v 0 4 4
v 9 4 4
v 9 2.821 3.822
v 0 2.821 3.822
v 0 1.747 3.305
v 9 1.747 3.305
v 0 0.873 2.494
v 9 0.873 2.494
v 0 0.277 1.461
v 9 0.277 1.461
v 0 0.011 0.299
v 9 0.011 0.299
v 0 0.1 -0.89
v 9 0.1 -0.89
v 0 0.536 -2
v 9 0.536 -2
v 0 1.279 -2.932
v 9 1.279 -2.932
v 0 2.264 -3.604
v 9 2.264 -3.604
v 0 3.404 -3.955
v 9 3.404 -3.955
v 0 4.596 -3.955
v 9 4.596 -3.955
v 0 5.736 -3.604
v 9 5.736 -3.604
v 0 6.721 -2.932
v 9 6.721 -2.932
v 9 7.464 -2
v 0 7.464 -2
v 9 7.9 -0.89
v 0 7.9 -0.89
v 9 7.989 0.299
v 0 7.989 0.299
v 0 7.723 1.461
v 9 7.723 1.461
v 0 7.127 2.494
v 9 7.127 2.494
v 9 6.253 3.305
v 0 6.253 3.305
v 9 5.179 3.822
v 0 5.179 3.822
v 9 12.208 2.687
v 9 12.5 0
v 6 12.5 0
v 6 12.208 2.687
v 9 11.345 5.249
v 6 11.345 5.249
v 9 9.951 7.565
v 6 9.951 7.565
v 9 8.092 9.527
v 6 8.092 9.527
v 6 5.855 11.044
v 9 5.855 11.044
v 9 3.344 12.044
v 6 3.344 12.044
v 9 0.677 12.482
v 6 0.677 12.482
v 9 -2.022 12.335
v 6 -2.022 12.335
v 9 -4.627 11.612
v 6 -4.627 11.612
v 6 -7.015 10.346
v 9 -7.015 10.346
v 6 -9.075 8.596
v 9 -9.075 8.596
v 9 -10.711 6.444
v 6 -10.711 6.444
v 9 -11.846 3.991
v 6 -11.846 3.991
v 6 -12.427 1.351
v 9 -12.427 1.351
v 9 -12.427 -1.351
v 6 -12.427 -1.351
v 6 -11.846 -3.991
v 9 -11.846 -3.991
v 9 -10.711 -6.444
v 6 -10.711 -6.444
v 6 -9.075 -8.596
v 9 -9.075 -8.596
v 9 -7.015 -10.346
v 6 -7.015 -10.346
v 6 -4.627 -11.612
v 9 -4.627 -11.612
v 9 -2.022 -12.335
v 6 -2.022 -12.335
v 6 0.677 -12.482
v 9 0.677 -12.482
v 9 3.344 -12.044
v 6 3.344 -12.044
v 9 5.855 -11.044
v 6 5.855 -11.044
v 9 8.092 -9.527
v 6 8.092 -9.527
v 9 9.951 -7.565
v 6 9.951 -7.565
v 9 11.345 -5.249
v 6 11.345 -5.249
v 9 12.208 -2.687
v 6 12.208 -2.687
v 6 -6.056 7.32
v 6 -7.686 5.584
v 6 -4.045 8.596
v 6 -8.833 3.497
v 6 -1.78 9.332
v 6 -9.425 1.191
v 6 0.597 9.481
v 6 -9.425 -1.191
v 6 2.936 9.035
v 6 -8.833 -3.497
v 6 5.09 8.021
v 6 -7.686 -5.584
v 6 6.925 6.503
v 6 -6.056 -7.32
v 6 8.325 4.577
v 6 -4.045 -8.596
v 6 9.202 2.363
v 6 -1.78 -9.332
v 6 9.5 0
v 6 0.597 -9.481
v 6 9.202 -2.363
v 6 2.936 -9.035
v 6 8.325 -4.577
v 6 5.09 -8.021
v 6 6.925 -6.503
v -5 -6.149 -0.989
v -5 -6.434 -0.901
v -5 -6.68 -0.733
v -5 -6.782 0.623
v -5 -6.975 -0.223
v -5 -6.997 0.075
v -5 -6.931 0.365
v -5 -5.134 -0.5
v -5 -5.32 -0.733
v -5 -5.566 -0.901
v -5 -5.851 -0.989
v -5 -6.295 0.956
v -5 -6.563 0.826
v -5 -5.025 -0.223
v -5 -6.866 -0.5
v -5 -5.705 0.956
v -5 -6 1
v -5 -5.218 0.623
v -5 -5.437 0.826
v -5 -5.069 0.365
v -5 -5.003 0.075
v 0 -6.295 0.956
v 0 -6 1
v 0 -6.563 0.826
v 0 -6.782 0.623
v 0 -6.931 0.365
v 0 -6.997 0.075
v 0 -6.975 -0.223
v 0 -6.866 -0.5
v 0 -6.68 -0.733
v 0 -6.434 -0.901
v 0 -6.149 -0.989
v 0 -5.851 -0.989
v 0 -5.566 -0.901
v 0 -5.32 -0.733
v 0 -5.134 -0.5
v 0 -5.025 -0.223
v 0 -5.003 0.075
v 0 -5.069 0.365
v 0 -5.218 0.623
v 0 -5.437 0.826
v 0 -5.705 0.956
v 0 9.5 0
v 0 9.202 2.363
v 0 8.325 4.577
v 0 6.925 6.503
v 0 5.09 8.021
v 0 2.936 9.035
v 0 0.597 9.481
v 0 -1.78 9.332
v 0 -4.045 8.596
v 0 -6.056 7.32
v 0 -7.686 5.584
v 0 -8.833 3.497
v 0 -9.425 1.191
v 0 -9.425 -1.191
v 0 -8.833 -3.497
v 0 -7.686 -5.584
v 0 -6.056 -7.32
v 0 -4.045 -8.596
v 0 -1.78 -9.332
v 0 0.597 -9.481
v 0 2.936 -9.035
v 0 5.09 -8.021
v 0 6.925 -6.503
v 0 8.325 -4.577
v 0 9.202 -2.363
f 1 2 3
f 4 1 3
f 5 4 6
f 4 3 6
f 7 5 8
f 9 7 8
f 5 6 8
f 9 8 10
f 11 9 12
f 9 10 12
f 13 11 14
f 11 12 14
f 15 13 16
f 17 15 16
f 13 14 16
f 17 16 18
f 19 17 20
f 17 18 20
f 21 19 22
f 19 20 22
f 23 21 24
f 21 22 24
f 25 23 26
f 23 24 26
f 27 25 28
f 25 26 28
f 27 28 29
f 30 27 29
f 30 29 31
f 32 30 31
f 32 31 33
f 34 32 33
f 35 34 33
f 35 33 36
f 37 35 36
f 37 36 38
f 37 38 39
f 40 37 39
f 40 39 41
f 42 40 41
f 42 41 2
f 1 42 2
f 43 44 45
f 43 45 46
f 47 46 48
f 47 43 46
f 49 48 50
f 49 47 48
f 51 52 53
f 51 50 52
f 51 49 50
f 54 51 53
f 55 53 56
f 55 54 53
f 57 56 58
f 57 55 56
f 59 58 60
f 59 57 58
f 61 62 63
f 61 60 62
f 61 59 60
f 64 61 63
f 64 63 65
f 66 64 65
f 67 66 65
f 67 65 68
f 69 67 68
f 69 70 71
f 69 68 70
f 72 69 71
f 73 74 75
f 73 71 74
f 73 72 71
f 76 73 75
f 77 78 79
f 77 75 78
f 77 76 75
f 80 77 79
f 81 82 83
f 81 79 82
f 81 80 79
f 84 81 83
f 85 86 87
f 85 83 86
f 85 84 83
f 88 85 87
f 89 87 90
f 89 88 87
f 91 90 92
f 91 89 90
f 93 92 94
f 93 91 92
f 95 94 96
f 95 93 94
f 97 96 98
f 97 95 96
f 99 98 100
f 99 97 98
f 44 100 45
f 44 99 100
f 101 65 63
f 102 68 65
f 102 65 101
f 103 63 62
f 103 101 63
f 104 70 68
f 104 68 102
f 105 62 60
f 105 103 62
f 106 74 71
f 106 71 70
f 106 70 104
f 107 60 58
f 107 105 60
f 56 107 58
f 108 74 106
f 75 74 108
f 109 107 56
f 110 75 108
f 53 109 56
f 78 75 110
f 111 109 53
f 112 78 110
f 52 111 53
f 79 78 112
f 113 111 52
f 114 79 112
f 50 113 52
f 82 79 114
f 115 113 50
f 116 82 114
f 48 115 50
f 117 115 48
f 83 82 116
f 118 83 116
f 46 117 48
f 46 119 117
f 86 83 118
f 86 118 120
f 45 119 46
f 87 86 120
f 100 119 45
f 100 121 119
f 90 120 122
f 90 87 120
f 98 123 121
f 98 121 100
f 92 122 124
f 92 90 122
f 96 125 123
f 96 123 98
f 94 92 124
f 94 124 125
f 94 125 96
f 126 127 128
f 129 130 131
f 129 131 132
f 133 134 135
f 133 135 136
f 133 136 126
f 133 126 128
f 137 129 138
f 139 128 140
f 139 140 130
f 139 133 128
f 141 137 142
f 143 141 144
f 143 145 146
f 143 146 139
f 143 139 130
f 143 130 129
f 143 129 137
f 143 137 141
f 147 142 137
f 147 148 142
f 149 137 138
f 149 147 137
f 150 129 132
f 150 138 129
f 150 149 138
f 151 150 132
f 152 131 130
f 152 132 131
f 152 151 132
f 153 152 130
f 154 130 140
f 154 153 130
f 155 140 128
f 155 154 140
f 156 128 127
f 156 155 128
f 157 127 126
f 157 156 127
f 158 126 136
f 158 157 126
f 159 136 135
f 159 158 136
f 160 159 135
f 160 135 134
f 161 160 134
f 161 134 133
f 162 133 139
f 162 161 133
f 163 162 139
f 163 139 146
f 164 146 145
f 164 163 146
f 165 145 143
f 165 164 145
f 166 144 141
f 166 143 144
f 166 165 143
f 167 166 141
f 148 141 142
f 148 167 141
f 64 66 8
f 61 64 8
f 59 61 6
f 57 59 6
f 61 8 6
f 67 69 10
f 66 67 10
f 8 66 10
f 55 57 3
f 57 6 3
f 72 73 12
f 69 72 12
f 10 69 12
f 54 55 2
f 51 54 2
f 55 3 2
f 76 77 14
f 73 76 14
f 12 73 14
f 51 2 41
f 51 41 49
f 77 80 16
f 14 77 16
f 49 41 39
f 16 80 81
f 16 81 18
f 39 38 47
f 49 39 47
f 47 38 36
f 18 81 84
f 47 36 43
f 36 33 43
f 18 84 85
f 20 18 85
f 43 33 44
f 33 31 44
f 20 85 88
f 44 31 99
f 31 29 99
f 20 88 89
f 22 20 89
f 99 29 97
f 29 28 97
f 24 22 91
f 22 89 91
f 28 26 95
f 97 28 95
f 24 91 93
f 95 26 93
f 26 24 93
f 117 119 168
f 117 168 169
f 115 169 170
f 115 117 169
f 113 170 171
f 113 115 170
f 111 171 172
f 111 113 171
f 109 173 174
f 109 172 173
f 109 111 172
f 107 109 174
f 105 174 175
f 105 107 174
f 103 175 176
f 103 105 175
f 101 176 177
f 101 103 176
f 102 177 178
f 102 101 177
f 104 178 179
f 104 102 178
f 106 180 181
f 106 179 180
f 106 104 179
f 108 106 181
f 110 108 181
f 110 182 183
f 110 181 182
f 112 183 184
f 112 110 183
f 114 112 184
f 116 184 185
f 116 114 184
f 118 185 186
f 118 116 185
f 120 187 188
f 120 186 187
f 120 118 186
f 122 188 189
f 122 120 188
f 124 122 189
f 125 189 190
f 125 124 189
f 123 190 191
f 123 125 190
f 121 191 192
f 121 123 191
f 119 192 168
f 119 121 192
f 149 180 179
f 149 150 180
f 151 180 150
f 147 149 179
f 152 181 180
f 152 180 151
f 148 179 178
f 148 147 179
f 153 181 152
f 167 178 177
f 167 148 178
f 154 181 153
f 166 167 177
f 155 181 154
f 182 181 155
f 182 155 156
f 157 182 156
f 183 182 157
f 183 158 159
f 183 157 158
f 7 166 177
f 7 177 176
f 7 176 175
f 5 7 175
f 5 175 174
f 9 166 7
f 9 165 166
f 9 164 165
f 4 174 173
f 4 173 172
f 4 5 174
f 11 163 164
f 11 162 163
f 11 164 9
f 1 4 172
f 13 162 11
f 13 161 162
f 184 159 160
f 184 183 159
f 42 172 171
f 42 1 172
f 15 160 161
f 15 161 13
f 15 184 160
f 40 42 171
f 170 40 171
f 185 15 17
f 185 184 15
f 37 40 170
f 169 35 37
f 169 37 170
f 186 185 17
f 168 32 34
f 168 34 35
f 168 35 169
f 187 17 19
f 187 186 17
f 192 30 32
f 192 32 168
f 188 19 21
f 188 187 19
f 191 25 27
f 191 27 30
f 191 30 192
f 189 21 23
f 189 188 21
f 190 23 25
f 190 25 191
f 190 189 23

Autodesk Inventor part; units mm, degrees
ref_plane "YZ Plane" through (0, 0, 0) normal (1, 0, 0) x (0, 1, 0)
ref_plane "XZ Plane" through (0, 0, 0) normal (0, 1, 0) x (-1, 0, 0)
ref_plane "XY Plane" through (0, 0, 0) normal (0, 0, 1) x (1, 0, 0)
sketch "Sketch1" plane through (0, 0, 0) normal (0, 0, 1) x (1, 0, 0)
  line L0 (0, 0) -> (0, 9.5)
  line L1 (0, 9.5) -> (6, 9.5)
  line L2 (6, 9.5) -> (6, 12.5)
  line L3 (6, 12.5) -> (9, 12.5)
  line L4 (9, 12.5) -> (9, 0)
  line L5 (9, 0) -> (0, 0)
  point P0 (7.5, 12.5)
  dimension "d0" = 3
  dimension "d1" = 6
  dimension "d2" = 25
  dimension "d3" = 19
revolve "Revolution1" add sketch "Sketch1" angle 360 about axis through (9, 0, 0) along (-1, 0, 0)
sketch "Sketch2" plane through (0, 0, 0) normal (-1, 0, 0) x (0, 0, 1)
  point P0 (0, 0)
  point P1 (0, 4)
  dimension "d12" = 4
hole "Hole1" at (0, 4, 0) direction (1, 0, 0) diameter 8 depth 9
sketch "Sketch4" plane through (0, 0, 0) normal (-1, 0, 0) x (0, 0, 1)
  circle A0 centre (0, -6) radius 1
  point P0 (0, 0)
  dimension "d21" = 6
  dimension "d22" = 2
extrude "Extrusion1" add sketch "Sketch4" along normal blind 5
properties part number "203"
